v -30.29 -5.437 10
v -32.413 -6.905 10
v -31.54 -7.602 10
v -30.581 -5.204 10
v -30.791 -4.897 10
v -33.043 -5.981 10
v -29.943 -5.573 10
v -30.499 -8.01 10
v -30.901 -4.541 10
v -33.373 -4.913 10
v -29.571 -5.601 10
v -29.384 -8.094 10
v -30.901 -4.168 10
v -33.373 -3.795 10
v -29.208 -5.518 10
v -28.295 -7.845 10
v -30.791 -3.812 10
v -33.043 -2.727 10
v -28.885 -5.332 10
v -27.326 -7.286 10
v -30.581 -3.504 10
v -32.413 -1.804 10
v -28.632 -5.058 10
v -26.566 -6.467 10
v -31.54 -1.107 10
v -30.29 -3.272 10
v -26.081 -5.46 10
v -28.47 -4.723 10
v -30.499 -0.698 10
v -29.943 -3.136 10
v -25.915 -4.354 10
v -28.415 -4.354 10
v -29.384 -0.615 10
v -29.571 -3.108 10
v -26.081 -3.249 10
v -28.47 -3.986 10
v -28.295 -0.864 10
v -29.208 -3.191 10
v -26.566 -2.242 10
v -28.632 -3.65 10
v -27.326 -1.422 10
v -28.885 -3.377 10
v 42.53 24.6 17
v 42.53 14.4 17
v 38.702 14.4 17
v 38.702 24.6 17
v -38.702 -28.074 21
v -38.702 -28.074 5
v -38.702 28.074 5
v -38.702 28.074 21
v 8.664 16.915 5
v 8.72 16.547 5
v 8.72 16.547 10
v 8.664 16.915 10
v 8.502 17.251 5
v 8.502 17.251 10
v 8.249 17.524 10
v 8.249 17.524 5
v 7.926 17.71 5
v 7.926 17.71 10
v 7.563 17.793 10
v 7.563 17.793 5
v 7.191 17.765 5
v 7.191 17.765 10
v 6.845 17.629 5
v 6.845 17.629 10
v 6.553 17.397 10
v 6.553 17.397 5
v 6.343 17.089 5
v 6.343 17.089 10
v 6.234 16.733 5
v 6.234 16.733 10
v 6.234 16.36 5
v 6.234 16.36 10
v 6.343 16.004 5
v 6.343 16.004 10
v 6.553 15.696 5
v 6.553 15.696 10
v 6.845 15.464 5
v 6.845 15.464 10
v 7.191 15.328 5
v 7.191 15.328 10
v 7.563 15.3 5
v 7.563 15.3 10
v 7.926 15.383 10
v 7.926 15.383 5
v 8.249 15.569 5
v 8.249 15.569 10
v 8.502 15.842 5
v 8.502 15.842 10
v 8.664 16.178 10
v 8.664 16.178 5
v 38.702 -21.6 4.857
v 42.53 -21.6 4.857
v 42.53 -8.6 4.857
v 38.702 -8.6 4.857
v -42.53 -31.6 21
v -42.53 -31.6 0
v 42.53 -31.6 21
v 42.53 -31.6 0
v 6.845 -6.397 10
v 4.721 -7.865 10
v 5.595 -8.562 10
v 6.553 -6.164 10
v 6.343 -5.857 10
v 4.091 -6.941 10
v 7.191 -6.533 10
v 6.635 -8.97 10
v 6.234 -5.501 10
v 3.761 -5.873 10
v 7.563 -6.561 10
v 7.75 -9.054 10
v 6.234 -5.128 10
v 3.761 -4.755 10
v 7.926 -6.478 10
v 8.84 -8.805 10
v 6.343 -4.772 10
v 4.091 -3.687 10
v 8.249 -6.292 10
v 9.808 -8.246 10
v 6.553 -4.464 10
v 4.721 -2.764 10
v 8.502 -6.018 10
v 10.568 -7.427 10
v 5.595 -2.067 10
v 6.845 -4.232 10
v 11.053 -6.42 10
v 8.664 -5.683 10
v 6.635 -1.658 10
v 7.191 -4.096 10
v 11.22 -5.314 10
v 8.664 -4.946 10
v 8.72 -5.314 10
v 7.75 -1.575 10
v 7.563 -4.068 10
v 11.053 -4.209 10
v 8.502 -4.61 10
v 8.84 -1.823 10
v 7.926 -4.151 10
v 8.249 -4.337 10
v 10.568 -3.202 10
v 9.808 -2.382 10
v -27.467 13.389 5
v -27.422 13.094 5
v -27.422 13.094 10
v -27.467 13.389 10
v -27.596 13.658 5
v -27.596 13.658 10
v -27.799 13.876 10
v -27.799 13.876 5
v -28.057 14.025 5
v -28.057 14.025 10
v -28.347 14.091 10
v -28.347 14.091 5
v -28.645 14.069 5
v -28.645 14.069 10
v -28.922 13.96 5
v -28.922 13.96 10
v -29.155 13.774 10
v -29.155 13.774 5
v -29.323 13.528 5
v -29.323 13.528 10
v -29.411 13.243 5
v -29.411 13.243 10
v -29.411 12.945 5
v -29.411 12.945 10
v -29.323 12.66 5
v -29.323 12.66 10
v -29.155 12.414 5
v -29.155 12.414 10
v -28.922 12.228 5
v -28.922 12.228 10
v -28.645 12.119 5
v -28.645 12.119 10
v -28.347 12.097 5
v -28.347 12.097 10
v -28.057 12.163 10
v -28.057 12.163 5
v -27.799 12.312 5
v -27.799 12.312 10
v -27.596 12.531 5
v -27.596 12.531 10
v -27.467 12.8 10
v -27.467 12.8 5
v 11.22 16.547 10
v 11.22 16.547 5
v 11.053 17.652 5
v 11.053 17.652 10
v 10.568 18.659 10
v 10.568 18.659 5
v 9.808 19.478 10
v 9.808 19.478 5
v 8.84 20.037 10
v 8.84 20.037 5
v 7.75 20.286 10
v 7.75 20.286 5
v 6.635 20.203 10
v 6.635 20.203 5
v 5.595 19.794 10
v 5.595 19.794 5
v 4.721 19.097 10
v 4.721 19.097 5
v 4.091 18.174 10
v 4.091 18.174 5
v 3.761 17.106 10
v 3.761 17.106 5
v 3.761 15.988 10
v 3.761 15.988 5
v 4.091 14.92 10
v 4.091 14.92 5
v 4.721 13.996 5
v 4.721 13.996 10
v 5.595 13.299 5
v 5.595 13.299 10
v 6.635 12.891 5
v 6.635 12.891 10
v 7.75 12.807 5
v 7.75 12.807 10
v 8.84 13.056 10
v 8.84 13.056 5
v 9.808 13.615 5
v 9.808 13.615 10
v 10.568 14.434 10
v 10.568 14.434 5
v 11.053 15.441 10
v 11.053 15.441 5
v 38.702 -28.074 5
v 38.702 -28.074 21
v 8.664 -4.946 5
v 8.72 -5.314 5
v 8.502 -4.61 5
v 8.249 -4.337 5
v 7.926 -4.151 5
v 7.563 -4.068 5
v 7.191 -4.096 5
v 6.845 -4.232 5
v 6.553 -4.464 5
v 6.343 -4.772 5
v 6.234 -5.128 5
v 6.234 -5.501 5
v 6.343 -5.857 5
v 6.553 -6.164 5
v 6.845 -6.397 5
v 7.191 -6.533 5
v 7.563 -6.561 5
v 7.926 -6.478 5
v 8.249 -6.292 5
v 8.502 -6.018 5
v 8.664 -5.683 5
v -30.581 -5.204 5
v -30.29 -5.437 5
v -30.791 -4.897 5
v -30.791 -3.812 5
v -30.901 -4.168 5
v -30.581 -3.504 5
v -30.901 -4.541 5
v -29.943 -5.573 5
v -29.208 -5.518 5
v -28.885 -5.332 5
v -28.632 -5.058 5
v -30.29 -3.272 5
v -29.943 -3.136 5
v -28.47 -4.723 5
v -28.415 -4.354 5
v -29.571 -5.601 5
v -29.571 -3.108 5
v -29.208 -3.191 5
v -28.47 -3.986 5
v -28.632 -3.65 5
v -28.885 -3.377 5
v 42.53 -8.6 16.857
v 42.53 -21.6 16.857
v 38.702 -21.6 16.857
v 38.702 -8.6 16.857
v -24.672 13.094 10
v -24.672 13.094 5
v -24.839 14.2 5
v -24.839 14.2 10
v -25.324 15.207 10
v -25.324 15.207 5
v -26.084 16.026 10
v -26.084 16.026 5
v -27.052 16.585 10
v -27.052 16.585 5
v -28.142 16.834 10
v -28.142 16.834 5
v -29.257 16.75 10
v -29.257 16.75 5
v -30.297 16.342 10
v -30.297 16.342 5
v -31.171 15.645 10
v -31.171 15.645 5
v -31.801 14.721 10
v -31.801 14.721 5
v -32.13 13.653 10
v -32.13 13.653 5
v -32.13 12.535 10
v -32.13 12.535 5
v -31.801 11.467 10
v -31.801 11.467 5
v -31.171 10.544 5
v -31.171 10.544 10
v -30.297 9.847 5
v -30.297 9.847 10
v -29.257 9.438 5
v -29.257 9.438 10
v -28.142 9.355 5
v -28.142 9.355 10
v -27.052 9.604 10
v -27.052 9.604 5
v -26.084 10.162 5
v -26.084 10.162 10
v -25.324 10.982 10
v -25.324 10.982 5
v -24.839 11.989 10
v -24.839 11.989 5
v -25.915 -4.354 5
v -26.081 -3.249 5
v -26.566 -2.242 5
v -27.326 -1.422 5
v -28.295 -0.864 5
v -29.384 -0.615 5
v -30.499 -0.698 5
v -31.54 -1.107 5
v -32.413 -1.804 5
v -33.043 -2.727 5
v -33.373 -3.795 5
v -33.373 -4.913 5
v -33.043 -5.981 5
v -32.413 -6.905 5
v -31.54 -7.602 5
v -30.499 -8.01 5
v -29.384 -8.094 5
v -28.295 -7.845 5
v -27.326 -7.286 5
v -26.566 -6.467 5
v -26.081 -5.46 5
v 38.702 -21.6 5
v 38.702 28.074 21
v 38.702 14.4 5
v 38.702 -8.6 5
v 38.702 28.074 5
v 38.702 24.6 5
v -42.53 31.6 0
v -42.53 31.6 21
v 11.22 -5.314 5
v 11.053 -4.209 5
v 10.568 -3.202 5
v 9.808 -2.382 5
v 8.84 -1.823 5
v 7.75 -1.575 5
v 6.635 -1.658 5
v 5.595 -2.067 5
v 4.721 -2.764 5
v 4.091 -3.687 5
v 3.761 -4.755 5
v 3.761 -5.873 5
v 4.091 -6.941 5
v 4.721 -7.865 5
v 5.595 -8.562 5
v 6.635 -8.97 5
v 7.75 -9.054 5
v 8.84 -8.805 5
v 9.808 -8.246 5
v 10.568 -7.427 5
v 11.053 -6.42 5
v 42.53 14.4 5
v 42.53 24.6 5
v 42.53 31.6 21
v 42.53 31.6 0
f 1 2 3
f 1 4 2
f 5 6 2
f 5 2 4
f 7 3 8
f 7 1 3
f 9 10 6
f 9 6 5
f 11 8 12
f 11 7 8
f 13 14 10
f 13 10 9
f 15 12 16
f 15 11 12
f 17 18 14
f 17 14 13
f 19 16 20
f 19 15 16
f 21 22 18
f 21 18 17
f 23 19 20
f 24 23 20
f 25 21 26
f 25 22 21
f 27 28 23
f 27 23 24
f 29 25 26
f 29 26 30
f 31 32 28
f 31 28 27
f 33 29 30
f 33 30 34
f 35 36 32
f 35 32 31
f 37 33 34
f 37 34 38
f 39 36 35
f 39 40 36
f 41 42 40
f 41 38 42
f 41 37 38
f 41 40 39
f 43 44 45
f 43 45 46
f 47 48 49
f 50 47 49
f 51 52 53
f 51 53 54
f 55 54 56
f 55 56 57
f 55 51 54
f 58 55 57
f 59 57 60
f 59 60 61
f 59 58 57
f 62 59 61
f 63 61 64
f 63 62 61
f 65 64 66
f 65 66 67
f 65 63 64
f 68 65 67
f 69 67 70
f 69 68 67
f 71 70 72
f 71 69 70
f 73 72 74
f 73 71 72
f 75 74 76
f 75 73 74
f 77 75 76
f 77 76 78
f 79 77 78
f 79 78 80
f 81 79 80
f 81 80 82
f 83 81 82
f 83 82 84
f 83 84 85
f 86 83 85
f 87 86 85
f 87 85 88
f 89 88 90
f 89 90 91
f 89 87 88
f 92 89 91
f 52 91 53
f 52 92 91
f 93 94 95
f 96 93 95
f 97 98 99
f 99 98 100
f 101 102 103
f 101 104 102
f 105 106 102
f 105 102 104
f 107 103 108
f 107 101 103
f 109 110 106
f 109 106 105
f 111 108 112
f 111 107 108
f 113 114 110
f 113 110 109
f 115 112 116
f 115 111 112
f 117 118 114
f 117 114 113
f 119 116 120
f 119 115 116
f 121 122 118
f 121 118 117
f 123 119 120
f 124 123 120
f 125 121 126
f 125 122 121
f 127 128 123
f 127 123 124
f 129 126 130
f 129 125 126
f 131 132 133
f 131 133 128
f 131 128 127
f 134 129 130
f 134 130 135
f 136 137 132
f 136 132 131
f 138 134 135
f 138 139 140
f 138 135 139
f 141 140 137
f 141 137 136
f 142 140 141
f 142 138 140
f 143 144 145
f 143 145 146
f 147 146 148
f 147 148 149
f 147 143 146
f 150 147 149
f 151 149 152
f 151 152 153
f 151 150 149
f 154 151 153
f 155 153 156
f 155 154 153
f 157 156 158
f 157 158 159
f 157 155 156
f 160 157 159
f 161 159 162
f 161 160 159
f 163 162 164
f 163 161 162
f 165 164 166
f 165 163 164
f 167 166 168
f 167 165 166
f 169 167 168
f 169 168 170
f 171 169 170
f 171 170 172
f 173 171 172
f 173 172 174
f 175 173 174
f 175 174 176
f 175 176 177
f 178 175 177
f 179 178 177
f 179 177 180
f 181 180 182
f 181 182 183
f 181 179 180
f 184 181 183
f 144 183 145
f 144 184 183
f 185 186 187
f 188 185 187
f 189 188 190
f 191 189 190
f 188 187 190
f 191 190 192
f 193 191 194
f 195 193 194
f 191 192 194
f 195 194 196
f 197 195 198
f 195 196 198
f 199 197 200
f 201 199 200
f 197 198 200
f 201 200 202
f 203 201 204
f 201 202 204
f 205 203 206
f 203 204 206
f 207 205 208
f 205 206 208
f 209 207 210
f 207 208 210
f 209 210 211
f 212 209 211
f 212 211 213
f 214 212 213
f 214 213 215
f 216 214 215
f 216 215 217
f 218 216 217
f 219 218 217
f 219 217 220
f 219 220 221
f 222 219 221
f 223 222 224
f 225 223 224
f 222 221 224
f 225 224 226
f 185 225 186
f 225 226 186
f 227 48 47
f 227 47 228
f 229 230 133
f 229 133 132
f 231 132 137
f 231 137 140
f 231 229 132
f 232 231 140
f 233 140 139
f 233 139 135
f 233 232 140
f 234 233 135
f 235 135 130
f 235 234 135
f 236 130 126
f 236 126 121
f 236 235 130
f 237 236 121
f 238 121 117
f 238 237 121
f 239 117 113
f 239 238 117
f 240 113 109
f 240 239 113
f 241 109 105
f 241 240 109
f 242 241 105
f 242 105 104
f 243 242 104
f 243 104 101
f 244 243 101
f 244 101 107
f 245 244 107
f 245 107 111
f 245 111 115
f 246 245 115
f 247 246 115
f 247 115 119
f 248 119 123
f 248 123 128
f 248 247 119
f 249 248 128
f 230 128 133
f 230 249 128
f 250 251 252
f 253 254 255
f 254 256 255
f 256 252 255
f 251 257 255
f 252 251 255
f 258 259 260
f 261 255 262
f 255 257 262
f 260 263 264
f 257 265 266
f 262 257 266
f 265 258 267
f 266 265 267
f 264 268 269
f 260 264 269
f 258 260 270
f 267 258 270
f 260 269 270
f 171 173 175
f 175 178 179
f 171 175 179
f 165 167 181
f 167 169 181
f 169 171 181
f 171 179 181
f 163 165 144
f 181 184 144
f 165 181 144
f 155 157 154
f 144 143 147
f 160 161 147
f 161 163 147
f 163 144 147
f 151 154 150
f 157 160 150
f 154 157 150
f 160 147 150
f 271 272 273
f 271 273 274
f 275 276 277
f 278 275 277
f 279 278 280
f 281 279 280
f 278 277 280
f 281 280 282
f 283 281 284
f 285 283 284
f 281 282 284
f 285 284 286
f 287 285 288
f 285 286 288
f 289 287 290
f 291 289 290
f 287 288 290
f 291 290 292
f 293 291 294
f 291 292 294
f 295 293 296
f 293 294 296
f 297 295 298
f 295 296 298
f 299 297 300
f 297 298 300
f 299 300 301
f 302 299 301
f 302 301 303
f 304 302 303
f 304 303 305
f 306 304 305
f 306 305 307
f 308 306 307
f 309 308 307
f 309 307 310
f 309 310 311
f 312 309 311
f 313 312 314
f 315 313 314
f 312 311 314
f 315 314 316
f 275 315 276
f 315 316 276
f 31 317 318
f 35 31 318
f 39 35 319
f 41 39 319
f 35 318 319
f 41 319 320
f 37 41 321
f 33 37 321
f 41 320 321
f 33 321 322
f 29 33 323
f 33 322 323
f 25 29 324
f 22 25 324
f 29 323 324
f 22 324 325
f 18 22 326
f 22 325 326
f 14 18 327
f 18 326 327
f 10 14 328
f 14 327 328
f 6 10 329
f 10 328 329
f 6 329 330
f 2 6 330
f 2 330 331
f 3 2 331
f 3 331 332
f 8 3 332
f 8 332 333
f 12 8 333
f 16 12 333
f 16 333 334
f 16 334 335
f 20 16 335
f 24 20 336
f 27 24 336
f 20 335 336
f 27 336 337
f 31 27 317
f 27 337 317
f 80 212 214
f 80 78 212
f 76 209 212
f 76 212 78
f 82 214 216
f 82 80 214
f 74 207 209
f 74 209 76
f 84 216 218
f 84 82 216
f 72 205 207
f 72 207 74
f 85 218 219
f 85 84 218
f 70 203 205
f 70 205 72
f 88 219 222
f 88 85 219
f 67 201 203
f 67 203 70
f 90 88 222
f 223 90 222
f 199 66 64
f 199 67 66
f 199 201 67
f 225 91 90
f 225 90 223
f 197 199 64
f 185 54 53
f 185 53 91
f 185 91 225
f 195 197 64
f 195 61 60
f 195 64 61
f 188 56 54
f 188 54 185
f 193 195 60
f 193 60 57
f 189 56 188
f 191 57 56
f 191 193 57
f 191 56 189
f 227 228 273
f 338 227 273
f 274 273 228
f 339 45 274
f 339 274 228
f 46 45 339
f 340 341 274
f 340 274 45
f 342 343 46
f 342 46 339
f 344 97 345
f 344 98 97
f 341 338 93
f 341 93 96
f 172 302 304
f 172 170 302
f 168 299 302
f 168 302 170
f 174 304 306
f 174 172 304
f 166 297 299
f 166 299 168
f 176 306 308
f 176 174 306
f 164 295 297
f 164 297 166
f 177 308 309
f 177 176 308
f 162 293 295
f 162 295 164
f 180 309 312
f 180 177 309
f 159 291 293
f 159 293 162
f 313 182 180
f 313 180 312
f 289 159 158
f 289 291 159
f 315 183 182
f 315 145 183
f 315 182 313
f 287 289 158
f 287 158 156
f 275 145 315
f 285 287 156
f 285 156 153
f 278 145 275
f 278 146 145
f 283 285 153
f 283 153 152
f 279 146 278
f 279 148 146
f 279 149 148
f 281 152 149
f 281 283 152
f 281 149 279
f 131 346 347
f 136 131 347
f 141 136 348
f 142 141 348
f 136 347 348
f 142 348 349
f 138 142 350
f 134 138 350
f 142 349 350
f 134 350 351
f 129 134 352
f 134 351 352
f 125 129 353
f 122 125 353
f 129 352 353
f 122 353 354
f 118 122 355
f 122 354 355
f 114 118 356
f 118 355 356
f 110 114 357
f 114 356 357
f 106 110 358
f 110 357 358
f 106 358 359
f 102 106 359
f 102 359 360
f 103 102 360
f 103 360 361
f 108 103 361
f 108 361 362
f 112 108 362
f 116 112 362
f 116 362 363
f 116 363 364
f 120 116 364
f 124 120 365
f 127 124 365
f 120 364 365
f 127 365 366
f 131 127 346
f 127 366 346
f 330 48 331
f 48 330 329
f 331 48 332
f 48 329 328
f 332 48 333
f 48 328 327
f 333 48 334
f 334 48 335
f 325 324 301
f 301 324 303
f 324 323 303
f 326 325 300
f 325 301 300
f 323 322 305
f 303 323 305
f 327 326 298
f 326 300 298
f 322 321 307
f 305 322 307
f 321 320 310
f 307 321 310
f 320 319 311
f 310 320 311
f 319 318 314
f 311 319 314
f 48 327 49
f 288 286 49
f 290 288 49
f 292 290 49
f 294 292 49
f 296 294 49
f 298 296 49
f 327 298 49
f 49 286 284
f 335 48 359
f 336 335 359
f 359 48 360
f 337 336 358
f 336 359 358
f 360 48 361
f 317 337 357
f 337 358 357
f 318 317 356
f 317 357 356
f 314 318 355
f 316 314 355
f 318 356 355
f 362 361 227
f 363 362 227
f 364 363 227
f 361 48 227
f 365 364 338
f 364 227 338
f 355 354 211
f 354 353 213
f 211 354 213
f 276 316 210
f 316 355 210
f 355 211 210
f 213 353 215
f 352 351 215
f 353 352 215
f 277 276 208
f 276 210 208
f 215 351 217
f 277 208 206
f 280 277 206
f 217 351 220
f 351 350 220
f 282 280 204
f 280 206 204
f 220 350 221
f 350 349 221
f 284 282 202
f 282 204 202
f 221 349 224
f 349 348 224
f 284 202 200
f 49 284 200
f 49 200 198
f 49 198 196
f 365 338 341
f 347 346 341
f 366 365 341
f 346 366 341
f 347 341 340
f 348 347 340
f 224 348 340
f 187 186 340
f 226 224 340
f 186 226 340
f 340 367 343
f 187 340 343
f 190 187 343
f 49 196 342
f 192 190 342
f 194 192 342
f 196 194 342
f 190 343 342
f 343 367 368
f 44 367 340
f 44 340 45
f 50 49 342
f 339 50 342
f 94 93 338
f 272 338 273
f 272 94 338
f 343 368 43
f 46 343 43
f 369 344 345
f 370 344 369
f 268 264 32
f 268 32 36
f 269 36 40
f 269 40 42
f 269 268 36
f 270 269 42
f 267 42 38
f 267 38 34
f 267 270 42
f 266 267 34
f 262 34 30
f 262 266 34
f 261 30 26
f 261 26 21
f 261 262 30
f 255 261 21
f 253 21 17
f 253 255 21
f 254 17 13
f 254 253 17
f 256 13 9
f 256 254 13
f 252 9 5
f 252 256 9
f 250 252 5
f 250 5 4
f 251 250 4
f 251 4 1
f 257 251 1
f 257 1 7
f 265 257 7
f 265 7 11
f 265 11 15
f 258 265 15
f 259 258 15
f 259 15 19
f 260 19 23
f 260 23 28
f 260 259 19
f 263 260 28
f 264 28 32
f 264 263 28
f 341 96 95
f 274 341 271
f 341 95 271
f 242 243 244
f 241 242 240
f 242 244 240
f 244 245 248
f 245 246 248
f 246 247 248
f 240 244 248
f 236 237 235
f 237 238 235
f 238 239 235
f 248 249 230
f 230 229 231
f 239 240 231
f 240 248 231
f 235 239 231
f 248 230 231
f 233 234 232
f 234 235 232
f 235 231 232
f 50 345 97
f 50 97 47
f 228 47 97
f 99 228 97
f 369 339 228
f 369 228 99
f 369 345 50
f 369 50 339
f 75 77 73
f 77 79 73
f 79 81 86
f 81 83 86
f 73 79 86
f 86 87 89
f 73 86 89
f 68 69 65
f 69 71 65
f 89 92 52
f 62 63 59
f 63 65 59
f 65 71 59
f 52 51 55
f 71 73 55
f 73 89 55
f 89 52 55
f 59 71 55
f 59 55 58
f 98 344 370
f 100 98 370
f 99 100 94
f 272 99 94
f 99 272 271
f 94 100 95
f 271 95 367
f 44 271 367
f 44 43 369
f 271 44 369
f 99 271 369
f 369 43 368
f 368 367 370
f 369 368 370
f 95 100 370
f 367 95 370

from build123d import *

# Parameters (mm, degrees)
F0_W     = 85.06
F0_H     = 63.2
F1_DEPTH = 5
F2_W     = 85.06
F2_H     = 63.2
F2_W_2   = 77.40441
F2_H_2   = 56.148566
F3_DEPTH = 16
F4_W     = 10.2
F4_H     = 12
F5_DEPTH = 25
F6_W     = 13
F6_H     = 12
F7_DEPTH = 3.827795
F8_R     = 3.75
F8_R_2   = 1
F8_R_3   = 1.25
F9_DEPTH = 5


with BuildPart() as f1:
    # F0 (on Top) → F1 (new body)
    with BuildSketch(Plane.XY):
        Rectangle(F0_W, F0_H)
    extrude(amount=F1_DEPTH)

    # F2 (on face) → F3 (join)
    with BuildSketch(Plane.XY.offset(5)):
        Rectangle(F2_W, F2_H)
        Rectangle(F2_W_2, F2_H_2, mode=Mode.SUBTRACT)
    extrude(amount=F3_DEPTH)

    # F4 (on face) → F5 (cut)
    with BuildSketch(Plane.YZ.offset(42.53)):
        with Locations((19.5, 11)):
            Rectangle(F4_W, F4_H)
    extrude(amount=-F5_DEPTH, mode=Mode.SUBTRACT)

    # F6 (on face) → F7 (cut, through all)
    with BuildSketch(Plane.YZ.offset(42.53)):
        with Locations((-15.1, 10.857148)):
            Rectangle(F6_W, F6_H)
    extrude(amount=-F7_DEPTH, mode=Mode.SUBTRACT)

    # F8 (on face) → F9 (join)
    with BuildSketch(Plane.XY.offset(5)):
        with Locations((-28.422205, 13.094283)):
            Circle(F8_R)
        with Locations((-28.422205, 13.094283)):
            Circle(F8_R_2, mode=Mode.SUBTRACT)
        with Locations((-29.664541, -4.354283)):
            Circle(F8_R)
        with Locations((-29.664541, -4.354283)):
            Circle(F8_R_3, mode=Mode.SUBTRACT)
        with Locations((7.469576, 16.546624)):
            Circle(F8_R)
        with Locations((7.469576, 16.546624)):
            Circle(F8_R_3, mode=Mode.SUBTRACT)
        with Locations((7.469576, -5.314252)):
            Circle(F8_R)
        with Locations((7.469576, -5.314252)):
            Circle(F8_R_3, mode=Mode.SUBTRACT)
    extrude(amount=F9_DEPTH)


solid = f1.part
